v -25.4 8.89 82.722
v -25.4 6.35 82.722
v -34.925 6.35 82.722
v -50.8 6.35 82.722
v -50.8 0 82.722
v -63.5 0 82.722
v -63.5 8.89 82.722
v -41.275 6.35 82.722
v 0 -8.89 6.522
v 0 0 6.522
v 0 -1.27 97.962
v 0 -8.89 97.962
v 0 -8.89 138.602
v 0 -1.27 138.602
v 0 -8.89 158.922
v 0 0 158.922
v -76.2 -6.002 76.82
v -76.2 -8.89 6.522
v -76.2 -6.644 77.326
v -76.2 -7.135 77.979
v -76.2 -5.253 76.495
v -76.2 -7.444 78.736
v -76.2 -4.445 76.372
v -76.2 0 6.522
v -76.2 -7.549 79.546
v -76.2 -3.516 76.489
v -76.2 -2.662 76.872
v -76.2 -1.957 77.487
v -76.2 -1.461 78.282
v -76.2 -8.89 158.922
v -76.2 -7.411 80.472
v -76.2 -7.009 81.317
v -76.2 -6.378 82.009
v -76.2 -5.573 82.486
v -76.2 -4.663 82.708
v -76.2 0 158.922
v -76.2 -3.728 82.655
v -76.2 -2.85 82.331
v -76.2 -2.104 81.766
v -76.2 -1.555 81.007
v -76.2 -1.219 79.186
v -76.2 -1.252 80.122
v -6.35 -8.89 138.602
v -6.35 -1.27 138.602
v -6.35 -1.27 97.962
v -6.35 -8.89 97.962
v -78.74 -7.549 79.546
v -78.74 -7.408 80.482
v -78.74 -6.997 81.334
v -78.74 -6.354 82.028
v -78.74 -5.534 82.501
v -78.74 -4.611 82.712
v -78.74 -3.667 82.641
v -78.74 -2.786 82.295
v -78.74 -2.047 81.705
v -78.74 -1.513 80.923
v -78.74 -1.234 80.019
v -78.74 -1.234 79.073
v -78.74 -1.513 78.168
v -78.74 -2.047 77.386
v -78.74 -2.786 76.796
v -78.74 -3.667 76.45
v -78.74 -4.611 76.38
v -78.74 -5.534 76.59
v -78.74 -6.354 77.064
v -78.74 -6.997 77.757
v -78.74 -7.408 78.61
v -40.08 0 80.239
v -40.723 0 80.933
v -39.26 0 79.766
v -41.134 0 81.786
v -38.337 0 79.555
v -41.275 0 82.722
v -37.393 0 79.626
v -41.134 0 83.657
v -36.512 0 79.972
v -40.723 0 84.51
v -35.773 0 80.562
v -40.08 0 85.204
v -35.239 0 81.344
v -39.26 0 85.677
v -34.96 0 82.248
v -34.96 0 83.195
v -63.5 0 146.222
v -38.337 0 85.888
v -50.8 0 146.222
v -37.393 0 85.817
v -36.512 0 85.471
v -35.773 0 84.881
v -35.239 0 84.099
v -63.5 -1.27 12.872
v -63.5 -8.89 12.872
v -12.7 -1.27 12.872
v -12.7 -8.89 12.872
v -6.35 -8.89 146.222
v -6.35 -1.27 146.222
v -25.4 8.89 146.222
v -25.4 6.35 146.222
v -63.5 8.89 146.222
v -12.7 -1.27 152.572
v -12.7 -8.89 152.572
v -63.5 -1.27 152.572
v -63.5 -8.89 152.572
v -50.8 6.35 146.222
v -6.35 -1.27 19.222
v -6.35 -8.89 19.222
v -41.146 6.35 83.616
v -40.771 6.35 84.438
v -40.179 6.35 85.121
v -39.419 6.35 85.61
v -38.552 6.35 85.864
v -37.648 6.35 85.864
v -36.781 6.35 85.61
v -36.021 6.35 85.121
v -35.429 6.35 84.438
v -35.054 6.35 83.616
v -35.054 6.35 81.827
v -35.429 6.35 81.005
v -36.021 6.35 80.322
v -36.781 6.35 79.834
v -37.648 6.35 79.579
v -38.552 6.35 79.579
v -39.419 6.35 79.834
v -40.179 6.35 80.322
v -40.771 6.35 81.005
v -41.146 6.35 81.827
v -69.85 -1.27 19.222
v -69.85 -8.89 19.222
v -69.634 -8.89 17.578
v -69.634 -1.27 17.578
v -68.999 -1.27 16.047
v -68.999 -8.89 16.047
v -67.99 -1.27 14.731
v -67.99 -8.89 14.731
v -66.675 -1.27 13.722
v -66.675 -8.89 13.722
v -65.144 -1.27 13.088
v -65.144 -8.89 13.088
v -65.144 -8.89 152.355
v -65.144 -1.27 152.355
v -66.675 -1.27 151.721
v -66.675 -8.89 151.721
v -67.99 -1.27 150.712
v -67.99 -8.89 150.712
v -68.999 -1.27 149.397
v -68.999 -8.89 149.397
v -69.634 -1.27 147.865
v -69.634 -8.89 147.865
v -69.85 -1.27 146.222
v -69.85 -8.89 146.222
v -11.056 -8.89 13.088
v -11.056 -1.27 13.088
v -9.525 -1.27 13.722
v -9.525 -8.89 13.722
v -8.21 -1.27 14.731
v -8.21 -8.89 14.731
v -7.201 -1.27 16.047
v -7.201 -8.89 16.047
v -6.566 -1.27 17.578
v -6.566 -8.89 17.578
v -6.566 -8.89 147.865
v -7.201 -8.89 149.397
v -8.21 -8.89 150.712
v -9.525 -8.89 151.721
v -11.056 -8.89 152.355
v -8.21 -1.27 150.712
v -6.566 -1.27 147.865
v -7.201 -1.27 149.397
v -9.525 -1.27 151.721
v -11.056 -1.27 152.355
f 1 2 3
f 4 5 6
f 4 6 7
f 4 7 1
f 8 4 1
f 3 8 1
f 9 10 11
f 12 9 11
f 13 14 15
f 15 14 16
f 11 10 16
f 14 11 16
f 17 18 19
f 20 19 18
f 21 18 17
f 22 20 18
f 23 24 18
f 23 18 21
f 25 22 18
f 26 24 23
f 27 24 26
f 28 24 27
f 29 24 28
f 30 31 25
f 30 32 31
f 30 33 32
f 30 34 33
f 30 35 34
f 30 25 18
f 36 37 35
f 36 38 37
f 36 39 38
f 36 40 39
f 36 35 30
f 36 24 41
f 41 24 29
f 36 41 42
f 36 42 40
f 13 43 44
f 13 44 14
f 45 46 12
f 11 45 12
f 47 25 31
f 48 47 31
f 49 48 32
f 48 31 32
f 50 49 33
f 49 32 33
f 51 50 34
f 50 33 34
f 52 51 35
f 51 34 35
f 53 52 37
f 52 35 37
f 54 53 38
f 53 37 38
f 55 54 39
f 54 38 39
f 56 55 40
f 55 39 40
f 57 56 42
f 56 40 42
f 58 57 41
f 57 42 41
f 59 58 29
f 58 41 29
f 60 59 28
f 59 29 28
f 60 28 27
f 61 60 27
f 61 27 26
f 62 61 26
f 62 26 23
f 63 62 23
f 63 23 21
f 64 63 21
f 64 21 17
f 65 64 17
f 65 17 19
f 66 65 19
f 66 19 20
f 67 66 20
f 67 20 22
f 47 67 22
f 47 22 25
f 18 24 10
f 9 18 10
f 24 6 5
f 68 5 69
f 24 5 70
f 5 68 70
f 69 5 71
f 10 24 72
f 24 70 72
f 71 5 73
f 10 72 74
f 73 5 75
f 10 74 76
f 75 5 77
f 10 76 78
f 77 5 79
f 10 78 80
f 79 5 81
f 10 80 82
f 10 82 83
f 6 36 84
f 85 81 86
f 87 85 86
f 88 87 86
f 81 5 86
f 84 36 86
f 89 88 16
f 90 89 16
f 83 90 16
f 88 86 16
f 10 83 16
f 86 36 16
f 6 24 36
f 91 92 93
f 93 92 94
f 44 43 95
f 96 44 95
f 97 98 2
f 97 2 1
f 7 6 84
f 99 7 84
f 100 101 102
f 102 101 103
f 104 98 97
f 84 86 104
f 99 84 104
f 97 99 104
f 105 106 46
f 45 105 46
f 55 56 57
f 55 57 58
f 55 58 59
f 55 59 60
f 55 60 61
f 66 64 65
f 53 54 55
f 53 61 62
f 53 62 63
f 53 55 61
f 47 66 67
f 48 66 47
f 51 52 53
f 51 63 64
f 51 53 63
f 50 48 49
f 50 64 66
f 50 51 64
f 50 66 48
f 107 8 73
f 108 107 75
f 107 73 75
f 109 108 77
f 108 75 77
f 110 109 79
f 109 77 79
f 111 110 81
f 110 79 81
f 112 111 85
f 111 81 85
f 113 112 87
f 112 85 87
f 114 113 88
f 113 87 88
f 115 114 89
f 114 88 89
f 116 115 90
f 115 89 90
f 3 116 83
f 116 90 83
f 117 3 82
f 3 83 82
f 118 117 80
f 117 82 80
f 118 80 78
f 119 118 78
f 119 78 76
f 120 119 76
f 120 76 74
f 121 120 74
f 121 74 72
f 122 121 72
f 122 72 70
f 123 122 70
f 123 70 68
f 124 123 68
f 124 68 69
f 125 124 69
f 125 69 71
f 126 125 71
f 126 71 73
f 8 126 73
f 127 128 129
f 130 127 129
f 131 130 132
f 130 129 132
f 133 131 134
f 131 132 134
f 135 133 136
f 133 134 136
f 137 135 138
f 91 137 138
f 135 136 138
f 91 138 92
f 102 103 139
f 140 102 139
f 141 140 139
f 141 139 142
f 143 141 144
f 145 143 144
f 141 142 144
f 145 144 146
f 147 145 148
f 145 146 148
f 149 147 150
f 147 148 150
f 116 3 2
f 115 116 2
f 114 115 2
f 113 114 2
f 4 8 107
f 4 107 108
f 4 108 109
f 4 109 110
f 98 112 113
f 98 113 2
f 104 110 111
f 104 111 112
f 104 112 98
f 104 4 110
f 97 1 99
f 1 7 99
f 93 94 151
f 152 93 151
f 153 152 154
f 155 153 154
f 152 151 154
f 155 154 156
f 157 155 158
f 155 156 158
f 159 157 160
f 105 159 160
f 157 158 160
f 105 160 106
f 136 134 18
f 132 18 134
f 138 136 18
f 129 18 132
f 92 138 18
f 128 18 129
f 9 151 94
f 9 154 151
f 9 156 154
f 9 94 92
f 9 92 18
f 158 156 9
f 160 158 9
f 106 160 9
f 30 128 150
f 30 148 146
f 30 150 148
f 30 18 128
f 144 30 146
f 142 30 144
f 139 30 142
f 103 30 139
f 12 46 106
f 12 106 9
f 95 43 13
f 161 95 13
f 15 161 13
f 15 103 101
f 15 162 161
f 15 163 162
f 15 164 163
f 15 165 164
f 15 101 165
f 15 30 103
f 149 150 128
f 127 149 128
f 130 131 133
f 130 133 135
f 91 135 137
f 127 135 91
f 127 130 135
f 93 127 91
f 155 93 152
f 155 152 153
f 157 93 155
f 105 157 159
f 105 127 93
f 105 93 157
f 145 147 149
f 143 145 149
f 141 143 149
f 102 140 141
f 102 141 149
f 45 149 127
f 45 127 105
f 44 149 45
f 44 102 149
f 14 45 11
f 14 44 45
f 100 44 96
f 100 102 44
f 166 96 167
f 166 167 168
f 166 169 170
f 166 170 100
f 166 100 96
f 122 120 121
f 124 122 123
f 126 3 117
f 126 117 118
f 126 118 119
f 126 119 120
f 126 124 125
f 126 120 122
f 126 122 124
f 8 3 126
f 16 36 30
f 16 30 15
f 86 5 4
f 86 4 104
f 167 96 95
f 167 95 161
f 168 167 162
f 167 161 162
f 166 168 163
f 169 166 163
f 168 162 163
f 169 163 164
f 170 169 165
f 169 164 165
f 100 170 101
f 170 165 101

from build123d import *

# Parameters (mm, degrees)
F0_W      = 76.2
F0_H      = 152.4
F1_DEPTH  = 8.89
F3_DEPTH  = 7.62
F4_W      = 6.35
F4_H      = 40.64
F5_DEPTH  = 7.62
F7_DEPTH  = 2.54
F7_FACE_R = 3.175
F8_DEPTH  = 5.08
F9_R      = 3.175
F10_DEPTH = 6.35
F11_W     = 12.7
F11_H     = 63.5
F12_DEPTH = 8.89
F13_W     = 2.54
F13_H     = 63.5
F14_DEPTH = 25.4


with BuildPart() as f1:
    # F0 (on Front) → F1 (new body)
    with BuildSketch(Plane.XZ):
        with Locations((-38.1, 82.721622)):
            Rectangle(F0_W, F0_H)
    extrude(amount=F1_DEPTH)

    # F2 (on face) → F3 (cut)
    with BuildSketch(Plane.XZ.offset(8.89)):
        with BuildLine():
            ThreePointArc((-69.85, 19.221622), (-67.990128, 14.731494), (-63.5, 12.871622))
            Line((-63.5, 12.871622), (-12.7, 12.871622))
            ThreePointArc((-12.7, 12.871622), (-8.209872, 14.731494), (-6.35, 19.221622))
            Line((-6.35, 19.221622), (-6.35, 146.221622))
            ThreePointArc((-6.35, 146.221622), (-8.209872, 150.71175), (-12.7, 152.571622))
            Line((-12.7, 152.571622), (-50.255585, 152.571622))
            Line((-50.255585, 152.571622), (-63.5, 152.571622))
            ThreePointArc((-63.5, 152.571622), (-67.990128, 150.71175), (-69.85, 146.221622))
            Line((-69.85, 146.221622), (-69.85, 115.075722))
            Line((-69.85, 115.075722), (-69.85, 19.221622))
        make_face()
    extrude(amount=-F3_DEPTH, mode=Mode.SUBTRACT)

    # F4 (on face) → F5 (cut)
    with BuildSketch(Plane.XZ.offset(8.89)):
        with Locations((-3.175, 118.281622)):
            Rectangle(F4_W, F4_H)
    extrude(amount=-F5_DEPTH, mode=Mode.SUBTRACT)

    # F6 (on face) → F7 (cut)
    with BuildSketch(Plane(origin=(-76.2, 0, 0), x_dir=(0, -1, 0), z_dir=(-1, 0, 0))):
        with BuildLine():
            ThreePointArc((4.445, 76.371622), (6.64402, 77.326013), (7.548988, 79.545828))
            ThreePointArc((7.548988, 79.545828), (2.103956, 81.765643), (4.445, 76.371622))
        make_face()
    extrude(amount=-F7_DEPTH, mode=Mode.SUBTRACT)

    # F7_face (on face) → F8 (join)
    with BuildSketch(Plane(origin=(-73.66, -4.373988, 79.545828), x_dir=(0, -1, 0), z_dir=(-1, 0, 0))):
        Circle(F7_FACE_R)
    extrude(amount=F8_DEPTH)

    # F9 (on face) → F10 (join)
    with BuildSketch(Plane(origin=(0, 0, 0), x_dir=(-1, 0, 0), z_dir=(0, 1, 0))):
        with Locations((38.1, 82.721622)):
            Circle(F9_R)
    extrude(amount=F10_DEPTH)

    # F11 (on face) → F12 (join)
    with BuildSketch(Plane(origin=(0, 0, 0), x_dir=(-1, 0, 0), z_dir=(0, 1, 0))):
        with Locations((57.15, 114.471622)):
            Rectangle(F11_W, F11_H)
    extrude(amount=F12_DEPTH)

    # F13 (on face) → F14 (join)
    with BuildSketch(Plane.YZ.offset(-50.8)):
        with Locations((7.62, 114.471622)):
            Rectangle(F13_W, F13_H)
    extrude(amount=F14_DEPTH)


solid = f1.part
